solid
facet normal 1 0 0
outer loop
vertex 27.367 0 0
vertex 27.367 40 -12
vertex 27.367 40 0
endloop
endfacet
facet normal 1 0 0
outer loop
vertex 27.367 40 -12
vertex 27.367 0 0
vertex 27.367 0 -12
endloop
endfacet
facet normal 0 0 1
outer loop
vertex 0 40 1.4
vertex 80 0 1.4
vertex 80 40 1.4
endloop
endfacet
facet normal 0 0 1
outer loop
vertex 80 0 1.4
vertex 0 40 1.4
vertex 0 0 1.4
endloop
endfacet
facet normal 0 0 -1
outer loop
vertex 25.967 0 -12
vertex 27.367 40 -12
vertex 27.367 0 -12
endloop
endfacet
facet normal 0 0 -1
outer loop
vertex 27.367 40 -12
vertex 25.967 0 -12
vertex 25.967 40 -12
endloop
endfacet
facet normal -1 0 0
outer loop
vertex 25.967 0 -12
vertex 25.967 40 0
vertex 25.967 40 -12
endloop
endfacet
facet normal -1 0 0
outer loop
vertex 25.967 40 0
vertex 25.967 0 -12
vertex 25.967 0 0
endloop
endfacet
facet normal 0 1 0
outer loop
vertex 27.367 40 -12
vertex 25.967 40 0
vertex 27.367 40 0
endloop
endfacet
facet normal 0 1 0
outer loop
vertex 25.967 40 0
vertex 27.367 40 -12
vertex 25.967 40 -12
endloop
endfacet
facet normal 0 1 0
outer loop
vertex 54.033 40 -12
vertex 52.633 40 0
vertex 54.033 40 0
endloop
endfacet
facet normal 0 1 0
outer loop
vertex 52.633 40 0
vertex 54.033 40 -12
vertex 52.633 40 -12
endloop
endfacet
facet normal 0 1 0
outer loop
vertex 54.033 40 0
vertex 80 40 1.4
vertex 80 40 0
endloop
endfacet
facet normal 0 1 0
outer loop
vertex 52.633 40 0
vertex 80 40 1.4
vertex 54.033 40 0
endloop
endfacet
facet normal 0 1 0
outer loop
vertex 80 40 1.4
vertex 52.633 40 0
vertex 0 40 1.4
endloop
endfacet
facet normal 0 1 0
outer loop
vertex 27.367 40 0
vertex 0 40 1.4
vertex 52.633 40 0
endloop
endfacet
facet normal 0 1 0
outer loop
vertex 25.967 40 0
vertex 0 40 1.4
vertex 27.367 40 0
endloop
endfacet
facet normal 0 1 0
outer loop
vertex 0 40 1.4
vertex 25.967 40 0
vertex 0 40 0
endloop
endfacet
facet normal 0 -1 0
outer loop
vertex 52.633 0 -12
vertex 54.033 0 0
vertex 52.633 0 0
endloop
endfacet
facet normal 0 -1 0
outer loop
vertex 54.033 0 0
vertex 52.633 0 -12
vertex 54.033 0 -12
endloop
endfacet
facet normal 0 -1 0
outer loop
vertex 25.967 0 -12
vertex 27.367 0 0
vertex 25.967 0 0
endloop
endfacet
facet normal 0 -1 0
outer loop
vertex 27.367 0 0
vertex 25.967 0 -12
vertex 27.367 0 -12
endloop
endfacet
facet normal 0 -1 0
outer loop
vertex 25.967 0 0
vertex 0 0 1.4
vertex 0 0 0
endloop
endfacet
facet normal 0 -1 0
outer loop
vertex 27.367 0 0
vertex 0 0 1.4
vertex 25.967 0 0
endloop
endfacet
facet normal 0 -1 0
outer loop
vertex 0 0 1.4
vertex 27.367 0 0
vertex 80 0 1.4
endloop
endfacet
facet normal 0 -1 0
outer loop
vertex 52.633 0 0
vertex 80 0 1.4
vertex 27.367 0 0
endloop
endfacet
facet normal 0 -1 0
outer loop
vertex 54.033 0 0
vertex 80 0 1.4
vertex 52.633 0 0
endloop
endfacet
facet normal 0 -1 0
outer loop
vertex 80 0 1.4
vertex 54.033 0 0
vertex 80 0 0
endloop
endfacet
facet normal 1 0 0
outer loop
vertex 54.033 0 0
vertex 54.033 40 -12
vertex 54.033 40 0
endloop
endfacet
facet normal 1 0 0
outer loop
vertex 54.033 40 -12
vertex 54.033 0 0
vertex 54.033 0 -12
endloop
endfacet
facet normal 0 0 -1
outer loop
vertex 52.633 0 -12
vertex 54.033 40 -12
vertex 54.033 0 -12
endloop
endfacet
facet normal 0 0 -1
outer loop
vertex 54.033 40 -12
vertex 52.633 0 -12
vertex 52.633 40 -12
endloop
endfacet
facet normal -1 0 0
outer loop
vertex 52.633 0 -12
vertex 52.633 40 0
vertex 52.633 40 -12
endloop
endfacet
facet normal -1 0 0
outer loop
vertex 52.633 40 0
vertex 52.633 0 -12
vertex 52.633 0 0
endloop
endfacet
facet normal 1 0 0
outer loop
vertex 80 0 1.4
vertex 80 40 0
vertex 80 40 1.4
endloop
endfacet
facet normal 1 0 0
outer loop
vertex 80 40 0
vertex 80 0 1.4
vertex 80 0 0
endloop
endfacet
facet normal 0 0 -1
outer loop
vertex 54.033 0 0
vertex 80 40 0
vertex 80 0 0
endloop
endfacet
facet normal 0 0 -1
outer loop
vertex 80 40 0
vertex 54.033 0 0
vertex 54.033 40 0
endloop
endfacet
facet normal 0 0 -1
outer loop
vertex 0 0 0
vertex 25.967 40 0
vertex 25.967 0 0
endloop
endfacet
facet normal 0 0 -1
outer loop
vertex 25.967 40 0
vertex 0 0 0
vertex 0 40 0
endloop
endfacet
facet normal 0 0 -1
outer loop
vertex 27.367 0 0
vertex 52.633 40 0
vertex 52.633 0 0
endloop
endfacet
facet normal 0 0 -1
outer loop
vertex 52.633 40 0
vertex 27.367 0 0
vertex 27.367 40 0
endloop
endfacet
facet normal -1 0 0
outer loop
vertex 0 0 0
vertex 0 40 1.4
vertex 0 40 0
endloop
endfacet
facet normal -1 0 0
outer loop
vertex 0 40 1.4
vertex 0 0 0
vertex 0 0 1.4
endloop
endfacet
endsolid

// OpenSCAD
$fn = 32;

// ----------------------------------------------------------------------
// Ribbed panel: 1.4 mm panel
// ----------------------------------------------------------------------

// --- parameters (mm) ---
panel_l = 80;             // panel length, X
panel_w = 40;             // panel width, Y
panel_t = 1.4;            // panel thickness, Z
rib_t = 1.4;              // rib thickness
rib_h = 12;               // rib height below the panel
ribs = 2;                 // number of ribs

total_h = panel_t + rib_h;  // overall height

union() {
  cube([panel_l, panel_w, panel_t]);
  for (i = [1 : ribs])
    translate([i * panel_l / (ribs + 1) - rib_t / 2, 0, -rib_h])
      cube([rib_t, panel_w, rib_h + panel_t]);
}
